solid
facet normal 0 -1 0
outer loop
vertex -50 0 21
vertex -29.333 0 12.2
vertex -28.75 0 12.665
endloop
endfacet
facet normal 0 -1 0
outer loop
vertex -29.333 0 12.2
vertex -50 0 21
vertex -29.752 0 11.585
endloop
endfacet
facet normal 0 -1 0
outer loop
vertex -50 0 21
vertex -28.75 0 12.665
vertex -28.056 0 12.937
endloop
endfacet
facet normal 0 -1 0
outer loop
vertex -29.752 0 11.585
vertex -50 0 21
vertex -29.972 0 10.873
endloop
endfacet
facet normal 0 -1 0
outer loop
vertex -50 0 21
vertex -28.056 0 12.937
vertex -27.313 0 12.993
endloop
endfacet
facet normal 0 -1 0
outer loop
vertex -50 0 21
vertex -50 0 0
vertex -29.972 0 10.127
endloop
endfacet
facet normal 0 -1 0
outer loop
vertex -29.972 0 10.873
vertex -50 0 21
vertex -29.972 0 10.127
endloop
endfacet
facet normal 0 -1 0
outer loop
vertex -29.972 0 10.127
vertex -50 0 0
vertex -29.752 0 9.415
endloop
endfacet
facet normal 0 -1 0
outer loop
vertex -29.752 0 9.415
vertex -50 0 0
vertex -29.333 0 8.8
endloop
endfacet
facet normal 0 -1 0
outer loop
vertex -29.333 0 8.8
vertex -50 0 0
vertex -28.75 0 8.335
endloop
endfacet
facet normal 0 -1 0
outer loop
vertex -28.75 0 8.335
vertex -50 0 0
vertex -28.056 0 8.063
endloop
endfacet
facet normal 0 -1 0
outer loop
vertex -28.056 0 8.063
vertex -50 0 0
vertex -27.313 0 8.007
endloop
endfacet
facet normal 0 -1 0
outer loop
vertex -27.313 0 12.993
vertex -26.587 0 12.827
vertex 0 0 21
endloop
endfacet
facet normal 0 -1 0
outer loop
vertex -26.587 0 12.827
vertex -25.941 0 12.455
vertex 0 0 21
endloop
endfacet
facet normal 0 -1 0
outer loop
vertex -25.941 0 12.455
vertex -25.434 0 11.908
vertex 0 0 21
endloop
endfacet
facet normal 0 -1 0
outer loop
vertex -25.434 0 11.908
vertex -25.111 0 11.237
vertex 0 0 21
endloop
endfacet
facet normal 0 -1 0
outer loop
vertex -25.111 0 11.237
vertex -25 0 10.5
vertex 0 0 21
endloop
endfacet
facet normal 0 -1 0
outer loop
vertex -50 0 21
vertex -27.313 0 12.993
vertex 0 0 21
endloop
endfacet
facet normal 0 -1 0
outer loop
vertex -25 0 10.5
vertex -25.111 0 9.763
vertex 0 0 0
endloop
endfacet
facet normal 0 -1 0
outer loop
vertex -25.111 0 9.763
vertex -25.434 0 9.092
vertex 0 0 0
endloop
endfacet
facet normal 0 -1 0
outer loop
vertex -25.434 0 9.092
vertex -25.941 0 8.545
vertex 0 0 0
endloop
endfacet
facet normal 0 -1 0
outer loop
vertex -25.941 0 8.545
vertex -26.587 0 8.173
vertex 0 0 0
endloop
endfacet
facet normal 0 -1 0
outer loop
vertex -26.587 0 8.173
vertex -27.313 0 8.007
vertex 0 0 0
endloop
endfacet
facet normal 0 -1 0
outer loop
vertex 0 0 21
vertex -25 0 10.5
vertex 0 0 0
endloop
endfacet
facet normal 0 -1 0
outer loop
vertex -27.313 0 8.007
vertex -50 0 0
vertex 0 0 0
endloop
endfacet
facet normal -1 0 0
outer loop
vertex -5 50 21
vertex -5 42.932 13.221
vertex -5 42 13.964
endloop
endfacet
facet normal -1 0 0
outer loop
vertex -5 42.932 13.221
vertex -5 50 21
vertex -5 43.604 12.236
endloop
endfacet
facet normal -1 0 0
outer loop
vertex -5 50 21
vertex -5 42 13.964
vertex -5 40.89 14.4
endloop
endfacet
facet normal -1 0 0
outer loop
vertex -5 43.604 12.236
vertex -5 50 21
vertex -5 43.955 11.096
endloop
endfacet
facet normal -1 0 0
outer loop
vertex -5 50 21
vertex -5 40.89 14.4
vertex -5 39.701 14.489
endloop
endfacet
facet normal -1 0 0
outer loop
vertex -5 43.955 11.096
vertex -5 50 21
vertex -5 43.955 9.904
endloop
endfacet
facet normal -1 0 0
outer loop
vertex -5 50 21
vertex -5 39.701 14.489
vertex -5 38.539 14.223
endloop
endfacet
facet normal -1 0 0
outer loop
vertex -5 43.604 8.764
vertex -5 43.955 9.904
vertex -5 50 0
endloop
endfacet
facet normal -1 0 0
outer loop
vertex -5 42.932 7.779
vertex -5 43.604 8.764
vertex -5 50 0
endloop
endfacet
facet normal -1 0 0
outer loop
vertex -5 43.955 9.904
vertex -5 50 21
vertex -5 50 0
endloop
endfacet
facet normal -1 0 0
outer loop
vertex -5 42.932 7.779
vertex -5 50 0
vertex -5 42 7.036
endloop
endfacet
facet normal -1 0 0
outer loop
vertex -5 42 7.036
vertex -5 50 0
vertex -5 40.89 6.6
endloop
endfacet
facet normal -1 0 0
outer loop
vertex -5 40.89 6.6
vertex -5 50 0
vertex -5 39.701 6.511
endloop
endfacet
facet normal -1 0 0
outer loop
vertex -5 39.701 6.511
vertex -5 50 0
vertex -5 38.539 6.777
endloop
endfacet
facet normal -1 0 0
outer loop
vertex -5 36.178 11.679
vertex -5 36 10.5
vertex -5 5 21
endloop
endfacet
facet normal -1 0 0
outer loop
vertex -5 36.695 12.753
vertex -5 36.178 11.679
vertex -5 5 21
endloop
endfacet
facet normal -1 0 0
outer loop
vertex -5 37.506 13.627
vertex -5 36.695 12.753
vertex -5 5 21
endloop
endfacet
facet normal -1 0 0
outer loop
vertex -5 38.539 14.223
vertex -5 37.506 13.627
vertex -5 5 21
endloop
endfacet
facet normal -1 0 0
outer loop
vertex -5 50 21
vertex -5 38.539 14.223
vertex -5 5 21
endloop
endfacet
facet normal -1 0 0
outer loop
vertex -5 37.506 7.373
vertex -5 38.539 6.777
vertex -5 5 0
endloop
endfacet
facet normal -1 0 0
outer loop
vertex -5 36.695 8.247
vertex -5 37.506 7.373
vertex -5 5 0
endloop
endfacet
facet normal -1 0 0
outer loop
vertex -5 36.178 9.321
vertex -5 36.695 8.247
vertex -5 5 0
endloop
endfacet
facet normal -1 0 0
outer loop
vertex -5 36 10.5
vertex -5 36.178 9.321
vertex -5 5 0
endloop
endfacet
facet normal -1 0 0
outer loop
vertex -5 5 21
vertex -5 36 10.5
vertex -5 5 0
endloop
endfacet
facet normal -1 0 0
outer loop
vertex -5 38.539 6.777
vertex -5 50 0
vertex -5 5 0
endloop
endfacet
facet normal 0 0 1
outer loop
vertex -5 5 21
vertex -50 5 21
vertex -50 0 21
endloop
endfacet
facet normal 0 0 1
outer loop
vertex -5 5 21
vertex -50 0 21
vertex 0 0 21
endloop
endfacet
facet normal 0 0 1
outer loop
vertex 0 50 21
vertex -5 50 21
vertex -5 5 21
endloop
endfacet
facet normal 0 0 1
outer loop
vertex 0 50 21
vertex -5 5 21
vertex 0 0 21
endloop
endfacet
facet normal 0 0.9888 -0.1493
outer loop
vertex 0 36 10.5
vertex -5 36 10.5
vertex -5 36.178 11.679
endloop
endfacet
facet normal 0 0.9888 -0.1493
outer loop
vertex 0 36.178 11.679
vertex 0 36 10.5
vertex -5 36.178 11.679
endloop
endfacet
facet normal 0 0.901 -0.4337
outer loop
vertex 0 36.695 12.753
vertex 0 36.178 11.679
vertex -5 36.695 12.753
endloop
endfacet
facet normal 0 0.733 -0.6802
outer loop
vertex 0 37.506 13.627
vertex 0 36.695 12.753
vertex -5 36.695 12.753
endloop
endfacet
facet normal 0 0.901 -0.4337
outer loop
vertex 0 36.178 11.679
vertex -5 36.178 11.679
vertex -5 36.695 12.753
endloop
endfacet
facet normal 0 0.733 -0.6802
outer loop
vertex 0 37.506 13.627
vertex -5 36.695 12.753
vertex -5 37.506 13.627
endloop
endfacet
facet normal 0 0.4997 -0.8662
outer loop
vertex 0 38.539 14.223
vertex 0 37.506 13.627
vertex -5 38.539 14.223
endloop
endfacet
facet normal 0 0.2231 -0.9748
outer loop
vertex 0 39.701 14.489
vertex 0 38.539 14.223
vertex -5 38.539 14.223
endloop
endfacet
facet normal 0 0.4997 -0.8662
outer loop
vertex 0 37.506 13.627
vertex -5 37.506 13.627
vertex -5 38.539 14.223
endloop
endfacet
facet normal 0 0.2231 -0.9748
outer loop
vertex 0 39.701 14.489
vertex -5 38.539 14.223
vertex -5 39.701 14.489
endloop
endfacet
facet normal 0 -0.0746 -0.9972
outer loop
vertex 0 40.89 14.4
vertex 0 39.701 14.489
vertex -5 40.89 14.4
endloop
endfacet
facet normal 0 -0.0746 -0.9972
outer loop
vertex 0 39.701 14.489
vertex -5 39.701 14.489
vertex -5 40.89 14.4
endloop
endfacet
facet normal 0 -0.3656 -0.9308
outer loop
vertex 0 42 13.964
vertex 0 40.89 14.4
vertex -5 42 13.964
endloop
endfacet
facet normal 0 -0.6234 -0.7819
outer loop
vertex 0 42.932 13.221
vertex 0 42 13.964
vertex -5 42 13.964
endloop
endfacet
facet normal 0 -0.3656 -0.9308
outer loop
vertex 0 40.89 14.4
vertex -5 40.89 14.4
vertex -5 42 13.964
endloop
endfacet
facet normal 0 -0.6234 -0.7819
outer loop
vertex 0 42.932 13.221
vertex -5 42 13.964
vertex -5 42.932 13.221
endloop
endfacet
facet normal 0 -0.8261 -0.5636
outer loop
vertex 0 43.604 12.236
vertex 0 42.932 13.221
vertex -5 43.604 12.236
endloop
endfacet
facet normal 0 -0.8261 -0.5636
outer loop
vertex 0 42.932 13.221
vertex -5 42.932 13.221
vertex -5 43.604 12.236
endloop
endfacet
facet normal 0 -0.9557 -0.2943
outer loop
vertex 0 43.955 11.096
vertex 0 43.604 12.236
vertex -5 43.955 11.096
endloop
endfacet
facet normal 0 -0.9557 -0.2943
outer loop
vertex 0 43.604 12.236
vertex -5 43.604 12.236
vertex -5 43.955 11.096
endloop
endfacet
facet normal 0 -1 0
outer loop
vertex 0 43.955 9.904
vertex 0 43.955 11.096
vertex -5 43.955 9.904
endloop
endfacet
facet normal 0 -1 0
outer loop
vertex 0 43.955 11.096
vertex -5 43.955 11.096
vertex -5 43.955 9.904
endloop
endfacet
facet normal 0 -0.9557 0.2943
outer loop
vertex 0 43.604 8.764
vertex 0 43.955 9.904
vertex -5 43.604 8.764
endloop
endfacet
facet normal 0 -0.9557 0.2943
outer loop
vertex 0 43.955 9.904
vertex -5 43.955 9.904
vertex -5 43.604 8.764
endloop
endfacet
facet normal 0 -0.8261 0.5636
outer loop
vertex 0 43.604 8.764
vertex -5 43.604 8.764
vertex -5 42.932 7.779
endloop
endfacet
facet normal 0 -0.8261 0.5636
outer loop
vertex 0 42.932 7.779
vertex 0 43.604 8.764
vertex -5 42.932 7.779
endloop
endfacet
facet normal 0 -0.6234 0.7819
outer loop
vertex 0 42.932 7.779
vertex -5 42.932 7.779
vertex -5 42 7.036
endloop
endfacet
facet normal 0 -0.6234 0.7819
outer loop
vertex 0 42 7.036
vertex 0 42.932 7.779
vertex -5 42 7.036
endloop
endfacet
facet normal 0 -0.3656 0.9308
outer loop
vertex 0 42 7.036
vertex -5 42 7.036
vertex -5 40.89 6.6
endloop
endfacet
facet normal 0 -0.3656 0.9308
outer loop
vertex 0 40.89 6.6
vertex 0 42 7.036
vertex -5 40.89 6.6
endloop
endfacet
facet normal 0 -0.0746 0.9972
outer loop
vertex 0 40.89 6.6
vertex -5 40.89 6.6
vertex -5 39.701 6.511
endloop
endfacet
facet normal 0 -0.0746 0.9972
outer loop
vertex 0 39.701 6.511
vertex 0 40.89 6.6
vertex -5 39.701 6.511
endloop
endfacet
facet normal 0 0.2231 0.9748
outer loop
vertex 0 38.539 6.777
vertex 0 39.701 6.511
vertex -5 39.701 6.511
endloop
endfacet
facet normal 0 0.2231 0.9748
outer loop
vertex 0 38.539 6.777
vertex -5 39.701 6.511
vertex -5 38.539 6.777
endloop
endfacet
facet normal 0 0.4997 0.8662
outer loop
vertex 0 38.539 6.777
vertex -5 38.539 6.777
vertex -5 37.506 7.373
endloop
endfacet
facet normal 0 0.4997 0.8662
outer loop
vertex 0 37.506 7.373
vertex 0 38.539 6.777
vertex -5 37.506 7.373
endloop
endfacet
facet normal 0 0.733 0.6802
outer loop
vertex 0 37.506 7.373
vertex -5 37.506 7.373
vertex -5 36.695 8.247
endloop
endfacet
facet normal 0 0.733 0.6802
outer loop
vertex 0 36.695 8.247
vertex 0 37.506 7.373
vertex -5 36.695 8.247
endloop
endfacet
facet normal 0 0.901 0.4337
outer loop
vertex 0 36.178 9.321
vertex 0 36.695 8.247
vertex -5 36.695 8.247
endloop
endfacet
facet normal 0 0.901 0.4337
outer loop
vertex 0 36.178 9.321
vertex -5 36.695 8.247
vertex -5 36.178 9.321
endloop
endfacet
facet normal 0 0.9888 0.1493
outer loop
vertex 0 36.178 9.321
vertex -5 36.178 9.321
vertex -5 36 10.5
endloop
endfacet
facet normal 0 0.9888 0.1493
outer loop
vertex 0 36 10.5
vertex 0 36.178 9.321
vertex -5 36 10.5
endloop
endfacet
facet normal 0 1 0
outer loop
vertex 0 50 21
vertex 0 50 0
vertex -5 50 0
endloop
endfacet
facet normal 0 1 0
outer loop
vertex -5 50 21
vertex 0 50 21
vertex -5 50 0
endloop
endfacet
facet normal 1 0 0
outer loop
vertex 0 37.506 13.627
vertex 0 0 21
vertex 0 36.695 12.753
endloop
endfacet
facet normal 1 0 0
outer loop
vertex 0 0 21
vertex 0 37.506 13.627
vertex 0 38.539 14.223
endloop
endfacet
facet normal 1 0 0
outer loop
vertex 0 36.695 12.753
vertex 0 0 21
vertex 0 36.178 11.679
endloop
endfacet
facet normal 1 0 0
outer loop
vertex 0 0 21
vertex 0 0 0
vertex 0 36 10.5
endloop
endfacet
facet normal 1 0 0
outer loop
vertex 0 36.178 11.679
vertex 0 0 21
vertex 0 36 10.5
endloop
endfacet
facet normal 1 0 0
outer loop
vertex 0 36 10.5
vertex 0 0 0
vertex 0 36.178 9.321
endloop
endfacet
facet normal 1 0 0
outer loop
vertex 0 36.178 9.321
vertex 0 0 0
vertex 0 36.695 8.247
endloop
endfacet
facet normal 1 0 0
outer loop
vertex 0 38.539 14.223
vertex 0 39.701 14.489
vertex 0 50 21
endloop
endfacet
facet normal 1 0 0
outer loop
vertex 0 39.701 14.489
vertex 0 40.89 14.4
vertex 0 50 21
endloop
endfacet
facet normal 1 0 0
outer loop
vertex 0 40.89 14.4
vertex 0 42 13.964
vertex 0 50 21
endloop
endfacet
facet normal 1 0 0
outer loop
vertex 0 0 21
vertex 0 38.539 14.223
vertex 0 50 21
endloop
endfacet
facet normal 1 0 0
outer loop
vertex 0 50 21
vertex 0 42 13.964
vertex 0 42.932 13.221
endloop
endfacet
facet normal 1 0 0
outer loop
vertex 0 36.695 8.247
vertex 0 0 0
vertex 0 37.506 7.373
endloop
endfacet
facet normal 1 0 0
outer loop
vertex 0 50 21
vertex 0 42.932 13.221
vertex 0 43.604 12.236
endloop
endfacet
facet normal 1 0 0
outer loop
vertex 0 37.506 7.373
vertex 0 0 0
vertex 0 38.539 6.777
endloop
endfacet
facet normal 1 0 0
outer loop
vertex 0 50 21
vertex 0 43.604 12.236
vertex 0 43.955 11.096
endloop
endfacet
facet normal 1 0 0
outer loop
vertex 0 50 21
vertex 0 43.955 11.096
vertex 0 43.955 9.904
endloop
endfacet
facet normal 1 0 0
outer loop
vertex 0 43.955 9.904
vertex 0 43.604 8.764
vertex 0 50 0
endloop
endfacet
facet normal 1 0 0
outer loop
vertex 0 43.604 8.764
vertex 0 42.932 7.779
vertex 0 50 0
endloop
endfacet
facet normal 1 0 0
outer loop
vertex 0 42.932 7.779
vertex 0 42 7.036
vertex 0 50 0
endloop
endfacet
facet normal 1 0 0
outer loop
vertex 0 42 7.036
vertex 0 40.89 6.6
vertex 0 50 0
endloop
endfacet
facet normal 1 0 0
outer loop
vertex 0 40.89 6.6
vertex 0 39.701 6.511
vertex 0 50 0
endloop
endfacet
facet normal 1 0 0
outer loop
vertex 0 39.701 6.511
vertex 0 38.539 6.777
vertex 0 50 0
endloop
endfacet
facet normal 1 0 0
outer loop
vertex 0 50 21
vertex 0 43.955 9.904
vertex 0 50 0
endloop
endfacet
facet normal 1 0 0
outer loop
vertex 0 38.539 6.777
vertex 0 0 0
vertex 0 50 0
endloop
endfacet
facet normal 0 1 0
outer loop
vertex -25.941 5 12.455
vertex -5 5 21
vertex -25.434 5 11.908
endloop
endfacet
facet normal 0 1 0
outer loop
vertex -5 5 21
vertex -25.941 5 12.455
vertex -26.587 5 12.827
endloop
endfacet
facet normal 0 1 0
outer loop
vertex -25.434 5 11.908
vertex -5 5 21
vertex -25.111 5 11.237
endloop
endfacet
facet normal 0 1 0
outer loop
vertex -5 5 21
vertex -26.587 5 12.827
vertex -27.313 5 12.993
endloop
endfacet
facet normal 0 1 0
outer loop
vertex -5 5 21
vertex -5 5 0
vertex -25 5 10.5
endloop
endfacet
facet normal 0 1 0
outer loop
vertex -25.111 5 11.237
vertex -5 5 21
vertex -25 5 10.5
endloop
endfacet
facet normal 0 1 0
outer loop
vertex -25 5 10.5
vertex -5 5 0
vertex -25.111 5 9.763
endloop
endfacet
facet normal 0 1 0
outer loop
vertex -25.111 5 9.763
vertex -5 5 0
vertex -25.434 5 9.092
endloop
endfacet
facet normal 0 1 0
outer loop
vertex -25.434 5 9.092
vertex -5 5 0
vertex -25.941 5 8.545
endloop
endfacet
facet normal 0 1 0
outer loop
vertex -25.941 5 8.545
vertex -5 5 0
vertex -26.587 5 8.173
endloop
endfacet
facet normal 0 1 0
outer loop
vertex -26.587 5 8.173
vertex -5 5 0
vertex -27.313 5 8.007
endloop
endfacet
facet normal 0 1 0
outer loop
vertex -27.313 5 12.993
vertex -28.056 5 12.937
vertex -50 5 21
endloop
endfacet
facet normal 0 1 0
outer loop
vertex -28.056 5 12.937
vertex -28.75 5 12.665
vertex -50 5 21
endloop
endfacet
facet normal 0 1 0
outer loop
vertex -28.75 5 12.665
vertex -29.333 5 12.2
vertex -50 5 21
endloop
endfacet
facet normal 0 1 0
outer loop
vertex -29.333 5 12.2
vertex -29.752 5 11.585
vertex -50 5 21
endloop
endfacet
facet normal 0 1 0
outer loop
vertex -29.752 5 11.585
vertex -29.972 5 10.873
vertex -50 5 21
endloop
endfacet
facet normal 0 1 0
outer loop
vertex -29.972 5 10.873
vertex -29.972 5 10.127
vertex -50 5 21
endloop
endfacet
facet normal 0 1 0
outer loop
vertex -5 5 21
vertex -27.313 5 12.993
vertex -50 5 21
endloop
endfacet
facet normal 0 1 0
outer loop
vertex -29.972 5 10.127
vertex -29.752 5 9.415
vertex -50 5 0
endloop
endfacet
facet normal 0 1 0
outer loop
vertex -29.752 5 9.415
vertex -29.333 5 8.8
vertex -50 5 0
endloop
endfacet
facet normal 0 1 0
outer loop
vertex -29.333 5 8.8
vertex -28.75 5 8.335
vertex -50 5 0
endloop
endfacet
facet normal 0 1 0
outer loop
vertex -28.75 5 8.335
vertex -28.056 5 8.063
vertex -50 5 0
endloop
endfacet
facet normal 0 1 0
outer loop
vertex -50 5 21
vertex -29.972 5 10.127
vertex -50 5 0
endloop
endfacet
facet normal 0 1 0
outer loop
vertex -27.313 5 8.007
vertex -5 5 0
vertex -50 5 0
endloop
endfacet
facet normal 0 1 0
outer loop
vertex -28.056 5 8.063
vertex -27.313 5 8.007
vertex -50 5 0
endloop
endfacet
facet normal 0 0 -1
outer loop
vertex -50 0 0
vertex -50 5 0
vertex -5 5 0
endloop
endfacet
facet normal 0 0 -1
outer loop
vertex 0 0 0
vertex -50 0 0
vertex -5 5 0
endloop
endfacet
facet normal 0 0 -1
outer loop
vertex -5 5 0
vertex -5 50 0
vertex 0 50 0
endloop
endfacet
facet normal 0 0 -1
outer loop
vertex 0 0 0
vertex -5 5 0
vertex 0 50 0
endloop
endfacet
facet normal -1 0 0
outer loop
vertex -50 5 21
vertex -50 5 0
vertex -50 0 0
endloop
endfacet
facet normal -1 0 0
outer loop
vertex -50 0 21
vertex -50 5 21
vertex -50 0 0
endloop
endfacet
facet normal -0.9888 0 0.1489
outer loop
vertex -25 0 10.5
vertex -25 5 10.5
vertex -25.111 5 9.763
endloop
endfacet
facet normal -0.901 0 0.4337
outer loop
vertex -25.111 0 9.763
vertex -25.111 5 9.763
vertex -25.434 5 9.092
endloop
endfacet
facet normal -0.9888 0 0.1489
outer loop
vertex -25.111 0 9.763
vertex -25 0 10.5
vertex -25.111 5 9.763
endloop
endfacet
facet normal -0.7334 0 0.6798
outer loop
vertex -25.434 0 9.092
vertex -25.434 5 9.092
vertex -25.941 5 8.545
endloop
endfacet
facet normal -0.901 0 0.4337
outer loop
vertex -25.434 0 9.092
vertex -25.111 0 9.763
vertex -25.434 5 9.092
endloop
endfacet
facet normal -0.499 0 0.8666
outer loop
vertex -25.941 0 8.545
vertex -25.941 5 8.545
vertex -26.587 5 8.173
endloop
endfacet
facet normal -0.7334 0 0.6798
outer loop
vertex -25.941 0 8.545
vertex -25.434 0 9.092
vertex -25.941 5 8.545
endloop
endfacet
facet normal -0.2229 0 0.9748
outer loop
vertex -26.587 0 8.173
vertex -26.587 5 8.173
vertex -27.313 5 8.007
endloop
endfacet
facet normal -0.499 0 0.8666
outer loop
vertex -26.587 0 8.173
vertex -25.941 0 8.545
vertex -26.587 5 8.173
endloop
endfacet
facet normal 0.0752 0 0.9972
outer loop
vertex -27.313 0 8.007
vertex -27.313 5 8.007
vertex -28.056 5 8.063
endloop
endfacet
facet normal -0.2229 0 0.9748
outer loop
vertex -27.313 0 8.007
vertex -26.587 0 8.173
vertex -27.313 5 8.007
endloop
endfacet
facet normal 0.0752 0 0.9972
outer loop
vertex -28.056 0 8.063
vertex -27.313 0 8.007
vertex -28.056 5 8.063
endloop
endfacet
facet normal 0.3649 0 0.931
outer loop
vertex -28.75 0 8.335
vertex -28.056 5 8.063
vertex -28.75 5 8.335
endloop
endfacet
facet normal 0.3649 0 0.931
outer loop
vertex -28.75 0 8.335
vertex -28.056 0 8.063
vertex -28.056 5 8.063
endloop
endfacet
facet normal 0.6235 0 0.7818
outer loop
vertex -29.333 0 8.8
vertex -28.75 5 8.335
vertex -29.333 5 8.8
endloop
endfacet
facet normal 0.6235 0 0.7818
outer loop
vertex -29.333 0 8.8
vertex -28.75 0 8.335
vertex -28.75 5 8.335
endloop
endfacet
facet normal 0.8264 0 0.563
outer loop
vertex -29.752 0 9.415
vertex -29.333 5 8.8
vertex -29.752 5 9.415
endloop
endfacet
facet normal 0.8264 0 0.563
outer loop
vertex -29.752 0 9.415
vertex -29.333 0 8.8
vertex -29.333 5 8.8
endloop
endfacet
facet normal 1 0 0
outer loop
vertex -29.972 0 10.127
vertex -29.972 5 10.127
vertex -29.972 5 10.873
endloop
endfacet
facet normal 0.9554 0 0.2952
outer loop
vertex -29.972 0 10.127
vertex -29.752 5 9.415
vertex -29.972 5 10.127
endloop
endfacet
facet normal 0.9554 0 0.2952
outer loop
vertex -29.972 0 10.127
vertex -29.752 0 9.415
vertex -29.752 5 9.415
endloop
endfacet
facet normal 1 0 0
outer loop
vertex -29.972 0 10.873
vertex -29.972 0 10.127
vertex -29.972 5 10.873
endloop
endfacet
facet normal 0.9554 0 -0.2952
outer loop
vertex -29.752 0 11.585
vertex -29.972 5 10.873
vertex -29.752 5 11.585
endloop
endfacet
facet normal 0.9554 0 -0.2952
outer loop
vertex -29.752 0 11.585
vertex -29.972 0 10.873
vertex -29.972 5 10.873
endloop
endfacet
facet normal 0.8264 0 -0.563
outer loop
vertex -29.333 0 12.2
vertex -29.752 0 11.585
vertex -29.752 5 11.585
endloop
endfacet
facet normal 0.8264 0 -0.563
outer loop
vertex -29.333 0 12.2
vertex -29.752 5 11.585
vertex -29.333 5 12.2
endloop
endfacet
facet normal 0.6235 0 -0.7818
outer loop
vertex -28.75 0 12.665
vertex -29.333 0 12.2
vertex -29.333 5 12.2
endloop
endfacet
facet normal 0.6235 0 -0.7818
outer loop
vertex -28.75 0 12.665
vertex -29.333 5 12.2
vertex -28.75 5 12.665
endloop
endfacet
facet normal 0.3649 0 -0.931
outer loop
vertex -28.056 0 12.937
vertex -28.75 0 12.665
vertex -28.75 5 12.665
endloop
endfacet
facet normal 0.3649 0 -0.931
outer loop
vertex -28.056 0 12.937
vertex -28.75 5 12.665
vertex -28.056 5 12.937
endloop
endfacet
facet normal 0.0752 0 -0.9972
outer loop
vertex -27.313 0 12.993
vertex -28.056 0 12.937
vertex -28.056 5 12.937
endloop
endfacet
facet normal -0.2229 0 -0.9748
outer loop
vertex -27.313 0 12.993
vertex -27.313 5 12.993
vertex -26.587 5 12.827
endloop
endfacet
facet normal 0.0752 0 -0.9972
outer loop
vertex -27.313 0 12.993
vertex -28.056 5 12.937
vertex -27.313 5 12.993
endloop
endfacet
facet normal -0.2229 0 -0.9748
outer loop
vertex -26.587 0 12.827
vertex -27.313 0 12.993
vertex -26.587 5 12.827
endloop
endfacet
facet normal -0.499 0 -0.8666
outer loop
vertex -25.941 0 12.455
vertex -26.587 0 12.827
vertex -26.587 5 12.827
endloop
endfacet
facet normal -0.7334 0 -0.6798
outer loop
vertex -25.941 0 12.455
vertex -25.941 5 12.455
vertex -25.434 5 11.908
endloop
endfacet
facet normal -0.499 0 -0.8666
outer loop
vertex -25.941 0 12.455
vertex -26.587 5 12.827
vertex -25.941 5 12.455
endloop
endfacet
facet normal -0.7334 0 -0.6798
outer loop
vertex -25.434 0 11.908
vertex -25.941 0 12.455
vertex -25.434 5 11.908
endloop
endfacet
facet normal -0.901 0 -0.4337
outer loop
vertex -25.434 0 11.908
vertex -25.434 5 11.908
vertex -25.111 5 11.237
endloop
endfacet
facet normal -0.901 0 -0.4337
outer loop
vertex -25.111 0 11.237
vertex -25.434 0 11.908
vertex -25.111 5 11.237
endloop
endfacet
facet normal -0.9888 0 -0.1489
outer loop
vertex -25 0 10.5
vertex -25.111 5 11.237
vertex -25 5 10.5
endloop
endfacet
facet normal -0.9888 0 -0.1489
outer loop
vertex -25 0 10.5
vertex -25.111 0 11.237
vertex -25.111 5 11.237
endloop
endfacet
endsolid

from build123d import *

# Parameters (mm, degrees)
BOSS_EXTRUDE1_DEPTH = 21
SKETCH3_R           = 4
CUT_EXTRUDE1_DEPTH  = 71.46985171
SKETCH4_R           = 2.5
CUT_EXTRUDE2_DEPTH  = 74.763134424


with BuildPart() as part:
    # Sketch2 → Boss-Extrude1 (new body)
    with BuildSketch(Plane.XY):
        Polygon((0, 0), (0, 50), (-5, 50), (-5, 5), (-50, 5), (-50, 0), align=None)
    extrude(amount=BOSS_EXTRUDE1_DEPTH)

    # Sketch3 → Cut-Extrude1 (cut, through all)
    with BuildSketch(Plane.ZY.offset(5)):
        with Locations(Location((10.5, 40, 0), (0, 0, 270))):
            Circle(SKETCH3_R)
    extrude(amount=-CUT_EXTRUDE1_DEPTH, mode=Mode.SUBTRACT)

    # Sketch4 → Cut-Extrude2 (cut, through all)
    with BuildSketch(Plane(origin=(0, 0, 0), x_dir=(1, 0, 0), z_dir=(0, 1, 0))):
        with Locations((-27.5, -10.5)):
            Circle(SKETCH4_R)
    extrude(amount=CUT_EXTRUDE2_DEPTH, mode=Mode.SUBTRACT)


solid = part.part
